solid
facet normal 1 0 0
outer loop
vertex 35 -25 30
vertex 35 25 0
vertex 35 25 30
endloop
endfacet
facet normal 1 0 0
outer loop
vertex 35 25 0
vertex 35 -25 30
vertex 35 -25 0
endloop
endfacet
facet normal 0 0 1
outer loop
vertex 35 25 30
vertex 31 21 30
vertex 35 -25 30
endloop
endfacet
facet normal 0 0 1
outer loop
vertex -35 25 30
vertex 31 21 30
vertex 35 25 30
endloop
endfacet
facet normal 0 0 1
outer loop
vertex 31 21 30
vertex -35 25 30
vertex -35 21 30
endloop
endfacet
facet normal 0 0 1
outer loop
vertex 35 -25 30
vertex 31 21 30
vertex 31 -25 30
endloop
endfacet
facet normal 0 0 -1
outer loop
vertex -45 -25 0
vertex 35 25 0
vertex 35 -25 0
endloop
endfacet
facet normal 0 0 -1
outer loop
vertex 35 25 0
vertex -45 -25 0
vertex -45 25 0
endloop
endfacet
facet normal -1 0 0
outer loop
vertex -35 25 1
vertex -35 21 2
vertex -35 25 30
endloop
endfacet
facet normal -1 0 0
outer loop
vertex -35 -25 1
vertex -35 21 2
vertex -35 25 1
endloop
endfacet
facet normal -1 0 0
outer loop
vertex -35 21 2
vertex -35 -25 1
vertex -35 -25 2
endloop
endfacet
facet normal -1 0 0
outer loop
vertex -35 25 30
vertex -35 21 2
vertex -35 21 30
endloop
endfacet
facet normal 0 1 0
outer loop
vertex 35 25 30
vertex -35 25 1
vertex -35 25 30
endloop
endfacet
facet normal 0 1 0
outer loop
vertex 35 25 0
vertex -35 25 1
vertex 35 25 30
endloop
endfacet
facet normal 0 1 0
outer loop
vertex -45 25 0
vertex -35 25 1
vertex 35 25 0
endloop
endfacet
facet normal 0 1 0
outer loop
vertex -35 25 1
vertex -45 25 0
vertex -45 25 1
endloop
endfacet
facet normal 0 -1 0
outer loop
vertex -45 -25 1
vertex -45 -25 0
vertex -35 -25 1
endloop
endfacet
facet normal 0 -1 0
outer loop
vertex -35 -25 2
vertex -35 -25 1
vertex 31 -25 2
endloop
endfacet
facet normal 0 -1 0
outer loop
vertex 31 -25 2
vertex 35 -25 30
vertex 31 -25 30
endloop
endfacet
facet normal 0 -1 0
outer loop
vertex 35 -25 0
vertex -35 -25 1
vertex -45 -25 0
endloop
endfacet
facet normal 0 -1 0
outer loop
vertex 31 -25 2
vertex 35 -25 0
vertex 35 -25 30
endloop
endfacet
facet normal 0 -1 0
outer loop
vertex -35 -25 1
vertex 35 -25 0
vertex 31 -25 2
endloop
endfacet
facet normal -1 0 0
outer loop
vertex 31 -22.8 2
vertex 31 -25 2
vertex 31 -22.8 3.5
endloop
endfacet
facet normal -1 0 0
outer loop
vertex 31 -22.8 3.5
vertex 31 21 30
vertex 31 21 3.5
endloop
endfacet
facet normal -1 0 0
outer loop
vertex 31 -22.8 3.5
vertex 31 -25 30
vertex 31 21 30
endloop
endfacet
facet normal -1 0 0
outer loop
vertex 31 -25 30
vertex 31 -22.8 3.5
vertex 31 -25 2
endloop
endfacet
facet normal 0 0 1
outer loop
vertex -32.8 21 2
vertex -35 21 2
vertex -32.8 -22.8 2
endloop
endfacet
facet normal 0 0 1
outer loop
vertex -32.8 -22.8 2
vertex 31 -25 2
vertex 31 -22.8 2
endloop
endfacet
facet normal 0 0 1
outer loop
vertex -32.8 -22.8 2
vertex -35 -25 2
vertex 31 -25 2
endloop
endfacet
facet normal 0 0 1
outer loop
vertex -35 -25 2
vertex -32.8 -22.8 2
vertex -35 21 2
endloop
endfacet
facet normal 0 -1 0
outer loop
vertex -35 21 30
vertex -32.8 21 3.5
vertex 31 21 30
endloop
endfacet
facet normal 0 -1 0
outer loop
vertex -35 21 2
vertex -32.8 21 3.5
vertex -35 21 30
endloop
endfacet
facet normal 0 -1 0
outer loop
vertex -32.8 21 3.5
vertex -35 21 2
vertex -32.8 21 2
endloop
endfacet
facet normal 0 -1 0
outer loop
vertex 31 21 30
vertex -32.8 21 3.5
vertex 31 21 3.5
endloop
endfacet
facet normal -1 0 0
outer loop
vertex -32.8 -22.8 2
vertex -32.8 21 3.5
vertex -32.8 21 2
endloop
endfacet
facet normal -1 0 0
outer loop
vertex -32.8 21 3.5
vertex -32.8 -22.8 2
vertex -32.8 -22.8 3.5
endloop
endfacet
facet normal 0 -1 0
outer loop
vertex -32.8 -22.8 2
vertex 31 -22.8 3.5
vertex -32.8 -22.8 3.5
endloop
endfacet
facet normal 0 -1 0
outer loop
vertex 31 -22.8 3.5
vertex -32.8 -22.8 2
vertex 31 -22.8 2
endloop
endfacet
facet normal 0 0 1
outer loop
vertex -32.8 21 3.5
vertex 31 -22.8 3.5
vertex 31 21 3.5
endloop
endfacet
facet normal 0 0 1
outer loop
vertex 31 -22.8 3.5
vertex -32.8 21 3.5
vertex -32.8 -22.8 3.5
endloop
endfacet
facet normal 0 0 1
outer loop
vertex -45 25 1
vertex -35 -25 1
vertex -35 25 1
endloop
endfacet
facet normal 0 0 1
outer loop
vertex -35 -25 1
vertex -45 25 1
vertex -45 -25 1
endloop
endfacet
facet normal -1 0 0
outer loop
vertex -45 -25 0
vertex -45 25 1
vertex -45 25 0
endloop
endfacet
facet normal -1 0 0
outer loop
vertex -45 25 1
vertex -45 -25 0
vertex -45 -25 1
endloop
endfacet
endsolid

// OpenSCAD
// Two-part enclosure for small electronics board
// Print orientation: both parts on bed (z = 0), lid on +X side, 10 mm gap

$fn = 64;

// ---- Dimensions (mm) ----
box_x      = 70;    // outer length of box
box_y      = 50;    // outer width of box
box_z      = 30;    // outer height of box
wall       = 2;     // wall thickness (sides and floor)
floor      = 2;     // floor thickness (separate from side walls)
lip_t      = 1.5;   // lip thickness (becomes part of lid height)
lip_h      = 4;     // lip height above plate
lip_x      = 65.6;  // outer length of lip
lip_y      = 45.6;  // outer width of lip
clearance  = 0.2;   // gap between lip outer size and box opening
gap        = 10;    // gap between box and lid

// ---- Derived ----
lip_z = lip_h + lip_t;              // total lid height
inner_x = box_x - 2 * wall;         // box opening length
inner_y = box_y - 2 * wall;         // box opening width

// ---- Model ----
union() {
    // Box
    translate([-box_x / 2, -box_y / 2, 0]) {
        difference() {
            cube([box_x, box_y, box_z]);
            // Open top: cut down to floor thickness
            translate([0, 0, floor])
                cube([inner_x, inner_y, box_z - floor + 0.01]);
        }
    }

    // Gap
    translate([-box_x / 2 - gap, -box_y / 2, 0]) {
        cube([(box_x / 2 + gap), box_y, 1]);
    }

    // Lid (plate + lip), printed upside down
    translate([-lip_x / 2, -lip_y / 2, 0]) {
        union() {
            // Plate
            cube([lip_x, lip_y, 2]);
            // Lip
            translate([0, 0, 2])
                cube([lip_x, lip_y, lip_t]);
        }
    }
}
